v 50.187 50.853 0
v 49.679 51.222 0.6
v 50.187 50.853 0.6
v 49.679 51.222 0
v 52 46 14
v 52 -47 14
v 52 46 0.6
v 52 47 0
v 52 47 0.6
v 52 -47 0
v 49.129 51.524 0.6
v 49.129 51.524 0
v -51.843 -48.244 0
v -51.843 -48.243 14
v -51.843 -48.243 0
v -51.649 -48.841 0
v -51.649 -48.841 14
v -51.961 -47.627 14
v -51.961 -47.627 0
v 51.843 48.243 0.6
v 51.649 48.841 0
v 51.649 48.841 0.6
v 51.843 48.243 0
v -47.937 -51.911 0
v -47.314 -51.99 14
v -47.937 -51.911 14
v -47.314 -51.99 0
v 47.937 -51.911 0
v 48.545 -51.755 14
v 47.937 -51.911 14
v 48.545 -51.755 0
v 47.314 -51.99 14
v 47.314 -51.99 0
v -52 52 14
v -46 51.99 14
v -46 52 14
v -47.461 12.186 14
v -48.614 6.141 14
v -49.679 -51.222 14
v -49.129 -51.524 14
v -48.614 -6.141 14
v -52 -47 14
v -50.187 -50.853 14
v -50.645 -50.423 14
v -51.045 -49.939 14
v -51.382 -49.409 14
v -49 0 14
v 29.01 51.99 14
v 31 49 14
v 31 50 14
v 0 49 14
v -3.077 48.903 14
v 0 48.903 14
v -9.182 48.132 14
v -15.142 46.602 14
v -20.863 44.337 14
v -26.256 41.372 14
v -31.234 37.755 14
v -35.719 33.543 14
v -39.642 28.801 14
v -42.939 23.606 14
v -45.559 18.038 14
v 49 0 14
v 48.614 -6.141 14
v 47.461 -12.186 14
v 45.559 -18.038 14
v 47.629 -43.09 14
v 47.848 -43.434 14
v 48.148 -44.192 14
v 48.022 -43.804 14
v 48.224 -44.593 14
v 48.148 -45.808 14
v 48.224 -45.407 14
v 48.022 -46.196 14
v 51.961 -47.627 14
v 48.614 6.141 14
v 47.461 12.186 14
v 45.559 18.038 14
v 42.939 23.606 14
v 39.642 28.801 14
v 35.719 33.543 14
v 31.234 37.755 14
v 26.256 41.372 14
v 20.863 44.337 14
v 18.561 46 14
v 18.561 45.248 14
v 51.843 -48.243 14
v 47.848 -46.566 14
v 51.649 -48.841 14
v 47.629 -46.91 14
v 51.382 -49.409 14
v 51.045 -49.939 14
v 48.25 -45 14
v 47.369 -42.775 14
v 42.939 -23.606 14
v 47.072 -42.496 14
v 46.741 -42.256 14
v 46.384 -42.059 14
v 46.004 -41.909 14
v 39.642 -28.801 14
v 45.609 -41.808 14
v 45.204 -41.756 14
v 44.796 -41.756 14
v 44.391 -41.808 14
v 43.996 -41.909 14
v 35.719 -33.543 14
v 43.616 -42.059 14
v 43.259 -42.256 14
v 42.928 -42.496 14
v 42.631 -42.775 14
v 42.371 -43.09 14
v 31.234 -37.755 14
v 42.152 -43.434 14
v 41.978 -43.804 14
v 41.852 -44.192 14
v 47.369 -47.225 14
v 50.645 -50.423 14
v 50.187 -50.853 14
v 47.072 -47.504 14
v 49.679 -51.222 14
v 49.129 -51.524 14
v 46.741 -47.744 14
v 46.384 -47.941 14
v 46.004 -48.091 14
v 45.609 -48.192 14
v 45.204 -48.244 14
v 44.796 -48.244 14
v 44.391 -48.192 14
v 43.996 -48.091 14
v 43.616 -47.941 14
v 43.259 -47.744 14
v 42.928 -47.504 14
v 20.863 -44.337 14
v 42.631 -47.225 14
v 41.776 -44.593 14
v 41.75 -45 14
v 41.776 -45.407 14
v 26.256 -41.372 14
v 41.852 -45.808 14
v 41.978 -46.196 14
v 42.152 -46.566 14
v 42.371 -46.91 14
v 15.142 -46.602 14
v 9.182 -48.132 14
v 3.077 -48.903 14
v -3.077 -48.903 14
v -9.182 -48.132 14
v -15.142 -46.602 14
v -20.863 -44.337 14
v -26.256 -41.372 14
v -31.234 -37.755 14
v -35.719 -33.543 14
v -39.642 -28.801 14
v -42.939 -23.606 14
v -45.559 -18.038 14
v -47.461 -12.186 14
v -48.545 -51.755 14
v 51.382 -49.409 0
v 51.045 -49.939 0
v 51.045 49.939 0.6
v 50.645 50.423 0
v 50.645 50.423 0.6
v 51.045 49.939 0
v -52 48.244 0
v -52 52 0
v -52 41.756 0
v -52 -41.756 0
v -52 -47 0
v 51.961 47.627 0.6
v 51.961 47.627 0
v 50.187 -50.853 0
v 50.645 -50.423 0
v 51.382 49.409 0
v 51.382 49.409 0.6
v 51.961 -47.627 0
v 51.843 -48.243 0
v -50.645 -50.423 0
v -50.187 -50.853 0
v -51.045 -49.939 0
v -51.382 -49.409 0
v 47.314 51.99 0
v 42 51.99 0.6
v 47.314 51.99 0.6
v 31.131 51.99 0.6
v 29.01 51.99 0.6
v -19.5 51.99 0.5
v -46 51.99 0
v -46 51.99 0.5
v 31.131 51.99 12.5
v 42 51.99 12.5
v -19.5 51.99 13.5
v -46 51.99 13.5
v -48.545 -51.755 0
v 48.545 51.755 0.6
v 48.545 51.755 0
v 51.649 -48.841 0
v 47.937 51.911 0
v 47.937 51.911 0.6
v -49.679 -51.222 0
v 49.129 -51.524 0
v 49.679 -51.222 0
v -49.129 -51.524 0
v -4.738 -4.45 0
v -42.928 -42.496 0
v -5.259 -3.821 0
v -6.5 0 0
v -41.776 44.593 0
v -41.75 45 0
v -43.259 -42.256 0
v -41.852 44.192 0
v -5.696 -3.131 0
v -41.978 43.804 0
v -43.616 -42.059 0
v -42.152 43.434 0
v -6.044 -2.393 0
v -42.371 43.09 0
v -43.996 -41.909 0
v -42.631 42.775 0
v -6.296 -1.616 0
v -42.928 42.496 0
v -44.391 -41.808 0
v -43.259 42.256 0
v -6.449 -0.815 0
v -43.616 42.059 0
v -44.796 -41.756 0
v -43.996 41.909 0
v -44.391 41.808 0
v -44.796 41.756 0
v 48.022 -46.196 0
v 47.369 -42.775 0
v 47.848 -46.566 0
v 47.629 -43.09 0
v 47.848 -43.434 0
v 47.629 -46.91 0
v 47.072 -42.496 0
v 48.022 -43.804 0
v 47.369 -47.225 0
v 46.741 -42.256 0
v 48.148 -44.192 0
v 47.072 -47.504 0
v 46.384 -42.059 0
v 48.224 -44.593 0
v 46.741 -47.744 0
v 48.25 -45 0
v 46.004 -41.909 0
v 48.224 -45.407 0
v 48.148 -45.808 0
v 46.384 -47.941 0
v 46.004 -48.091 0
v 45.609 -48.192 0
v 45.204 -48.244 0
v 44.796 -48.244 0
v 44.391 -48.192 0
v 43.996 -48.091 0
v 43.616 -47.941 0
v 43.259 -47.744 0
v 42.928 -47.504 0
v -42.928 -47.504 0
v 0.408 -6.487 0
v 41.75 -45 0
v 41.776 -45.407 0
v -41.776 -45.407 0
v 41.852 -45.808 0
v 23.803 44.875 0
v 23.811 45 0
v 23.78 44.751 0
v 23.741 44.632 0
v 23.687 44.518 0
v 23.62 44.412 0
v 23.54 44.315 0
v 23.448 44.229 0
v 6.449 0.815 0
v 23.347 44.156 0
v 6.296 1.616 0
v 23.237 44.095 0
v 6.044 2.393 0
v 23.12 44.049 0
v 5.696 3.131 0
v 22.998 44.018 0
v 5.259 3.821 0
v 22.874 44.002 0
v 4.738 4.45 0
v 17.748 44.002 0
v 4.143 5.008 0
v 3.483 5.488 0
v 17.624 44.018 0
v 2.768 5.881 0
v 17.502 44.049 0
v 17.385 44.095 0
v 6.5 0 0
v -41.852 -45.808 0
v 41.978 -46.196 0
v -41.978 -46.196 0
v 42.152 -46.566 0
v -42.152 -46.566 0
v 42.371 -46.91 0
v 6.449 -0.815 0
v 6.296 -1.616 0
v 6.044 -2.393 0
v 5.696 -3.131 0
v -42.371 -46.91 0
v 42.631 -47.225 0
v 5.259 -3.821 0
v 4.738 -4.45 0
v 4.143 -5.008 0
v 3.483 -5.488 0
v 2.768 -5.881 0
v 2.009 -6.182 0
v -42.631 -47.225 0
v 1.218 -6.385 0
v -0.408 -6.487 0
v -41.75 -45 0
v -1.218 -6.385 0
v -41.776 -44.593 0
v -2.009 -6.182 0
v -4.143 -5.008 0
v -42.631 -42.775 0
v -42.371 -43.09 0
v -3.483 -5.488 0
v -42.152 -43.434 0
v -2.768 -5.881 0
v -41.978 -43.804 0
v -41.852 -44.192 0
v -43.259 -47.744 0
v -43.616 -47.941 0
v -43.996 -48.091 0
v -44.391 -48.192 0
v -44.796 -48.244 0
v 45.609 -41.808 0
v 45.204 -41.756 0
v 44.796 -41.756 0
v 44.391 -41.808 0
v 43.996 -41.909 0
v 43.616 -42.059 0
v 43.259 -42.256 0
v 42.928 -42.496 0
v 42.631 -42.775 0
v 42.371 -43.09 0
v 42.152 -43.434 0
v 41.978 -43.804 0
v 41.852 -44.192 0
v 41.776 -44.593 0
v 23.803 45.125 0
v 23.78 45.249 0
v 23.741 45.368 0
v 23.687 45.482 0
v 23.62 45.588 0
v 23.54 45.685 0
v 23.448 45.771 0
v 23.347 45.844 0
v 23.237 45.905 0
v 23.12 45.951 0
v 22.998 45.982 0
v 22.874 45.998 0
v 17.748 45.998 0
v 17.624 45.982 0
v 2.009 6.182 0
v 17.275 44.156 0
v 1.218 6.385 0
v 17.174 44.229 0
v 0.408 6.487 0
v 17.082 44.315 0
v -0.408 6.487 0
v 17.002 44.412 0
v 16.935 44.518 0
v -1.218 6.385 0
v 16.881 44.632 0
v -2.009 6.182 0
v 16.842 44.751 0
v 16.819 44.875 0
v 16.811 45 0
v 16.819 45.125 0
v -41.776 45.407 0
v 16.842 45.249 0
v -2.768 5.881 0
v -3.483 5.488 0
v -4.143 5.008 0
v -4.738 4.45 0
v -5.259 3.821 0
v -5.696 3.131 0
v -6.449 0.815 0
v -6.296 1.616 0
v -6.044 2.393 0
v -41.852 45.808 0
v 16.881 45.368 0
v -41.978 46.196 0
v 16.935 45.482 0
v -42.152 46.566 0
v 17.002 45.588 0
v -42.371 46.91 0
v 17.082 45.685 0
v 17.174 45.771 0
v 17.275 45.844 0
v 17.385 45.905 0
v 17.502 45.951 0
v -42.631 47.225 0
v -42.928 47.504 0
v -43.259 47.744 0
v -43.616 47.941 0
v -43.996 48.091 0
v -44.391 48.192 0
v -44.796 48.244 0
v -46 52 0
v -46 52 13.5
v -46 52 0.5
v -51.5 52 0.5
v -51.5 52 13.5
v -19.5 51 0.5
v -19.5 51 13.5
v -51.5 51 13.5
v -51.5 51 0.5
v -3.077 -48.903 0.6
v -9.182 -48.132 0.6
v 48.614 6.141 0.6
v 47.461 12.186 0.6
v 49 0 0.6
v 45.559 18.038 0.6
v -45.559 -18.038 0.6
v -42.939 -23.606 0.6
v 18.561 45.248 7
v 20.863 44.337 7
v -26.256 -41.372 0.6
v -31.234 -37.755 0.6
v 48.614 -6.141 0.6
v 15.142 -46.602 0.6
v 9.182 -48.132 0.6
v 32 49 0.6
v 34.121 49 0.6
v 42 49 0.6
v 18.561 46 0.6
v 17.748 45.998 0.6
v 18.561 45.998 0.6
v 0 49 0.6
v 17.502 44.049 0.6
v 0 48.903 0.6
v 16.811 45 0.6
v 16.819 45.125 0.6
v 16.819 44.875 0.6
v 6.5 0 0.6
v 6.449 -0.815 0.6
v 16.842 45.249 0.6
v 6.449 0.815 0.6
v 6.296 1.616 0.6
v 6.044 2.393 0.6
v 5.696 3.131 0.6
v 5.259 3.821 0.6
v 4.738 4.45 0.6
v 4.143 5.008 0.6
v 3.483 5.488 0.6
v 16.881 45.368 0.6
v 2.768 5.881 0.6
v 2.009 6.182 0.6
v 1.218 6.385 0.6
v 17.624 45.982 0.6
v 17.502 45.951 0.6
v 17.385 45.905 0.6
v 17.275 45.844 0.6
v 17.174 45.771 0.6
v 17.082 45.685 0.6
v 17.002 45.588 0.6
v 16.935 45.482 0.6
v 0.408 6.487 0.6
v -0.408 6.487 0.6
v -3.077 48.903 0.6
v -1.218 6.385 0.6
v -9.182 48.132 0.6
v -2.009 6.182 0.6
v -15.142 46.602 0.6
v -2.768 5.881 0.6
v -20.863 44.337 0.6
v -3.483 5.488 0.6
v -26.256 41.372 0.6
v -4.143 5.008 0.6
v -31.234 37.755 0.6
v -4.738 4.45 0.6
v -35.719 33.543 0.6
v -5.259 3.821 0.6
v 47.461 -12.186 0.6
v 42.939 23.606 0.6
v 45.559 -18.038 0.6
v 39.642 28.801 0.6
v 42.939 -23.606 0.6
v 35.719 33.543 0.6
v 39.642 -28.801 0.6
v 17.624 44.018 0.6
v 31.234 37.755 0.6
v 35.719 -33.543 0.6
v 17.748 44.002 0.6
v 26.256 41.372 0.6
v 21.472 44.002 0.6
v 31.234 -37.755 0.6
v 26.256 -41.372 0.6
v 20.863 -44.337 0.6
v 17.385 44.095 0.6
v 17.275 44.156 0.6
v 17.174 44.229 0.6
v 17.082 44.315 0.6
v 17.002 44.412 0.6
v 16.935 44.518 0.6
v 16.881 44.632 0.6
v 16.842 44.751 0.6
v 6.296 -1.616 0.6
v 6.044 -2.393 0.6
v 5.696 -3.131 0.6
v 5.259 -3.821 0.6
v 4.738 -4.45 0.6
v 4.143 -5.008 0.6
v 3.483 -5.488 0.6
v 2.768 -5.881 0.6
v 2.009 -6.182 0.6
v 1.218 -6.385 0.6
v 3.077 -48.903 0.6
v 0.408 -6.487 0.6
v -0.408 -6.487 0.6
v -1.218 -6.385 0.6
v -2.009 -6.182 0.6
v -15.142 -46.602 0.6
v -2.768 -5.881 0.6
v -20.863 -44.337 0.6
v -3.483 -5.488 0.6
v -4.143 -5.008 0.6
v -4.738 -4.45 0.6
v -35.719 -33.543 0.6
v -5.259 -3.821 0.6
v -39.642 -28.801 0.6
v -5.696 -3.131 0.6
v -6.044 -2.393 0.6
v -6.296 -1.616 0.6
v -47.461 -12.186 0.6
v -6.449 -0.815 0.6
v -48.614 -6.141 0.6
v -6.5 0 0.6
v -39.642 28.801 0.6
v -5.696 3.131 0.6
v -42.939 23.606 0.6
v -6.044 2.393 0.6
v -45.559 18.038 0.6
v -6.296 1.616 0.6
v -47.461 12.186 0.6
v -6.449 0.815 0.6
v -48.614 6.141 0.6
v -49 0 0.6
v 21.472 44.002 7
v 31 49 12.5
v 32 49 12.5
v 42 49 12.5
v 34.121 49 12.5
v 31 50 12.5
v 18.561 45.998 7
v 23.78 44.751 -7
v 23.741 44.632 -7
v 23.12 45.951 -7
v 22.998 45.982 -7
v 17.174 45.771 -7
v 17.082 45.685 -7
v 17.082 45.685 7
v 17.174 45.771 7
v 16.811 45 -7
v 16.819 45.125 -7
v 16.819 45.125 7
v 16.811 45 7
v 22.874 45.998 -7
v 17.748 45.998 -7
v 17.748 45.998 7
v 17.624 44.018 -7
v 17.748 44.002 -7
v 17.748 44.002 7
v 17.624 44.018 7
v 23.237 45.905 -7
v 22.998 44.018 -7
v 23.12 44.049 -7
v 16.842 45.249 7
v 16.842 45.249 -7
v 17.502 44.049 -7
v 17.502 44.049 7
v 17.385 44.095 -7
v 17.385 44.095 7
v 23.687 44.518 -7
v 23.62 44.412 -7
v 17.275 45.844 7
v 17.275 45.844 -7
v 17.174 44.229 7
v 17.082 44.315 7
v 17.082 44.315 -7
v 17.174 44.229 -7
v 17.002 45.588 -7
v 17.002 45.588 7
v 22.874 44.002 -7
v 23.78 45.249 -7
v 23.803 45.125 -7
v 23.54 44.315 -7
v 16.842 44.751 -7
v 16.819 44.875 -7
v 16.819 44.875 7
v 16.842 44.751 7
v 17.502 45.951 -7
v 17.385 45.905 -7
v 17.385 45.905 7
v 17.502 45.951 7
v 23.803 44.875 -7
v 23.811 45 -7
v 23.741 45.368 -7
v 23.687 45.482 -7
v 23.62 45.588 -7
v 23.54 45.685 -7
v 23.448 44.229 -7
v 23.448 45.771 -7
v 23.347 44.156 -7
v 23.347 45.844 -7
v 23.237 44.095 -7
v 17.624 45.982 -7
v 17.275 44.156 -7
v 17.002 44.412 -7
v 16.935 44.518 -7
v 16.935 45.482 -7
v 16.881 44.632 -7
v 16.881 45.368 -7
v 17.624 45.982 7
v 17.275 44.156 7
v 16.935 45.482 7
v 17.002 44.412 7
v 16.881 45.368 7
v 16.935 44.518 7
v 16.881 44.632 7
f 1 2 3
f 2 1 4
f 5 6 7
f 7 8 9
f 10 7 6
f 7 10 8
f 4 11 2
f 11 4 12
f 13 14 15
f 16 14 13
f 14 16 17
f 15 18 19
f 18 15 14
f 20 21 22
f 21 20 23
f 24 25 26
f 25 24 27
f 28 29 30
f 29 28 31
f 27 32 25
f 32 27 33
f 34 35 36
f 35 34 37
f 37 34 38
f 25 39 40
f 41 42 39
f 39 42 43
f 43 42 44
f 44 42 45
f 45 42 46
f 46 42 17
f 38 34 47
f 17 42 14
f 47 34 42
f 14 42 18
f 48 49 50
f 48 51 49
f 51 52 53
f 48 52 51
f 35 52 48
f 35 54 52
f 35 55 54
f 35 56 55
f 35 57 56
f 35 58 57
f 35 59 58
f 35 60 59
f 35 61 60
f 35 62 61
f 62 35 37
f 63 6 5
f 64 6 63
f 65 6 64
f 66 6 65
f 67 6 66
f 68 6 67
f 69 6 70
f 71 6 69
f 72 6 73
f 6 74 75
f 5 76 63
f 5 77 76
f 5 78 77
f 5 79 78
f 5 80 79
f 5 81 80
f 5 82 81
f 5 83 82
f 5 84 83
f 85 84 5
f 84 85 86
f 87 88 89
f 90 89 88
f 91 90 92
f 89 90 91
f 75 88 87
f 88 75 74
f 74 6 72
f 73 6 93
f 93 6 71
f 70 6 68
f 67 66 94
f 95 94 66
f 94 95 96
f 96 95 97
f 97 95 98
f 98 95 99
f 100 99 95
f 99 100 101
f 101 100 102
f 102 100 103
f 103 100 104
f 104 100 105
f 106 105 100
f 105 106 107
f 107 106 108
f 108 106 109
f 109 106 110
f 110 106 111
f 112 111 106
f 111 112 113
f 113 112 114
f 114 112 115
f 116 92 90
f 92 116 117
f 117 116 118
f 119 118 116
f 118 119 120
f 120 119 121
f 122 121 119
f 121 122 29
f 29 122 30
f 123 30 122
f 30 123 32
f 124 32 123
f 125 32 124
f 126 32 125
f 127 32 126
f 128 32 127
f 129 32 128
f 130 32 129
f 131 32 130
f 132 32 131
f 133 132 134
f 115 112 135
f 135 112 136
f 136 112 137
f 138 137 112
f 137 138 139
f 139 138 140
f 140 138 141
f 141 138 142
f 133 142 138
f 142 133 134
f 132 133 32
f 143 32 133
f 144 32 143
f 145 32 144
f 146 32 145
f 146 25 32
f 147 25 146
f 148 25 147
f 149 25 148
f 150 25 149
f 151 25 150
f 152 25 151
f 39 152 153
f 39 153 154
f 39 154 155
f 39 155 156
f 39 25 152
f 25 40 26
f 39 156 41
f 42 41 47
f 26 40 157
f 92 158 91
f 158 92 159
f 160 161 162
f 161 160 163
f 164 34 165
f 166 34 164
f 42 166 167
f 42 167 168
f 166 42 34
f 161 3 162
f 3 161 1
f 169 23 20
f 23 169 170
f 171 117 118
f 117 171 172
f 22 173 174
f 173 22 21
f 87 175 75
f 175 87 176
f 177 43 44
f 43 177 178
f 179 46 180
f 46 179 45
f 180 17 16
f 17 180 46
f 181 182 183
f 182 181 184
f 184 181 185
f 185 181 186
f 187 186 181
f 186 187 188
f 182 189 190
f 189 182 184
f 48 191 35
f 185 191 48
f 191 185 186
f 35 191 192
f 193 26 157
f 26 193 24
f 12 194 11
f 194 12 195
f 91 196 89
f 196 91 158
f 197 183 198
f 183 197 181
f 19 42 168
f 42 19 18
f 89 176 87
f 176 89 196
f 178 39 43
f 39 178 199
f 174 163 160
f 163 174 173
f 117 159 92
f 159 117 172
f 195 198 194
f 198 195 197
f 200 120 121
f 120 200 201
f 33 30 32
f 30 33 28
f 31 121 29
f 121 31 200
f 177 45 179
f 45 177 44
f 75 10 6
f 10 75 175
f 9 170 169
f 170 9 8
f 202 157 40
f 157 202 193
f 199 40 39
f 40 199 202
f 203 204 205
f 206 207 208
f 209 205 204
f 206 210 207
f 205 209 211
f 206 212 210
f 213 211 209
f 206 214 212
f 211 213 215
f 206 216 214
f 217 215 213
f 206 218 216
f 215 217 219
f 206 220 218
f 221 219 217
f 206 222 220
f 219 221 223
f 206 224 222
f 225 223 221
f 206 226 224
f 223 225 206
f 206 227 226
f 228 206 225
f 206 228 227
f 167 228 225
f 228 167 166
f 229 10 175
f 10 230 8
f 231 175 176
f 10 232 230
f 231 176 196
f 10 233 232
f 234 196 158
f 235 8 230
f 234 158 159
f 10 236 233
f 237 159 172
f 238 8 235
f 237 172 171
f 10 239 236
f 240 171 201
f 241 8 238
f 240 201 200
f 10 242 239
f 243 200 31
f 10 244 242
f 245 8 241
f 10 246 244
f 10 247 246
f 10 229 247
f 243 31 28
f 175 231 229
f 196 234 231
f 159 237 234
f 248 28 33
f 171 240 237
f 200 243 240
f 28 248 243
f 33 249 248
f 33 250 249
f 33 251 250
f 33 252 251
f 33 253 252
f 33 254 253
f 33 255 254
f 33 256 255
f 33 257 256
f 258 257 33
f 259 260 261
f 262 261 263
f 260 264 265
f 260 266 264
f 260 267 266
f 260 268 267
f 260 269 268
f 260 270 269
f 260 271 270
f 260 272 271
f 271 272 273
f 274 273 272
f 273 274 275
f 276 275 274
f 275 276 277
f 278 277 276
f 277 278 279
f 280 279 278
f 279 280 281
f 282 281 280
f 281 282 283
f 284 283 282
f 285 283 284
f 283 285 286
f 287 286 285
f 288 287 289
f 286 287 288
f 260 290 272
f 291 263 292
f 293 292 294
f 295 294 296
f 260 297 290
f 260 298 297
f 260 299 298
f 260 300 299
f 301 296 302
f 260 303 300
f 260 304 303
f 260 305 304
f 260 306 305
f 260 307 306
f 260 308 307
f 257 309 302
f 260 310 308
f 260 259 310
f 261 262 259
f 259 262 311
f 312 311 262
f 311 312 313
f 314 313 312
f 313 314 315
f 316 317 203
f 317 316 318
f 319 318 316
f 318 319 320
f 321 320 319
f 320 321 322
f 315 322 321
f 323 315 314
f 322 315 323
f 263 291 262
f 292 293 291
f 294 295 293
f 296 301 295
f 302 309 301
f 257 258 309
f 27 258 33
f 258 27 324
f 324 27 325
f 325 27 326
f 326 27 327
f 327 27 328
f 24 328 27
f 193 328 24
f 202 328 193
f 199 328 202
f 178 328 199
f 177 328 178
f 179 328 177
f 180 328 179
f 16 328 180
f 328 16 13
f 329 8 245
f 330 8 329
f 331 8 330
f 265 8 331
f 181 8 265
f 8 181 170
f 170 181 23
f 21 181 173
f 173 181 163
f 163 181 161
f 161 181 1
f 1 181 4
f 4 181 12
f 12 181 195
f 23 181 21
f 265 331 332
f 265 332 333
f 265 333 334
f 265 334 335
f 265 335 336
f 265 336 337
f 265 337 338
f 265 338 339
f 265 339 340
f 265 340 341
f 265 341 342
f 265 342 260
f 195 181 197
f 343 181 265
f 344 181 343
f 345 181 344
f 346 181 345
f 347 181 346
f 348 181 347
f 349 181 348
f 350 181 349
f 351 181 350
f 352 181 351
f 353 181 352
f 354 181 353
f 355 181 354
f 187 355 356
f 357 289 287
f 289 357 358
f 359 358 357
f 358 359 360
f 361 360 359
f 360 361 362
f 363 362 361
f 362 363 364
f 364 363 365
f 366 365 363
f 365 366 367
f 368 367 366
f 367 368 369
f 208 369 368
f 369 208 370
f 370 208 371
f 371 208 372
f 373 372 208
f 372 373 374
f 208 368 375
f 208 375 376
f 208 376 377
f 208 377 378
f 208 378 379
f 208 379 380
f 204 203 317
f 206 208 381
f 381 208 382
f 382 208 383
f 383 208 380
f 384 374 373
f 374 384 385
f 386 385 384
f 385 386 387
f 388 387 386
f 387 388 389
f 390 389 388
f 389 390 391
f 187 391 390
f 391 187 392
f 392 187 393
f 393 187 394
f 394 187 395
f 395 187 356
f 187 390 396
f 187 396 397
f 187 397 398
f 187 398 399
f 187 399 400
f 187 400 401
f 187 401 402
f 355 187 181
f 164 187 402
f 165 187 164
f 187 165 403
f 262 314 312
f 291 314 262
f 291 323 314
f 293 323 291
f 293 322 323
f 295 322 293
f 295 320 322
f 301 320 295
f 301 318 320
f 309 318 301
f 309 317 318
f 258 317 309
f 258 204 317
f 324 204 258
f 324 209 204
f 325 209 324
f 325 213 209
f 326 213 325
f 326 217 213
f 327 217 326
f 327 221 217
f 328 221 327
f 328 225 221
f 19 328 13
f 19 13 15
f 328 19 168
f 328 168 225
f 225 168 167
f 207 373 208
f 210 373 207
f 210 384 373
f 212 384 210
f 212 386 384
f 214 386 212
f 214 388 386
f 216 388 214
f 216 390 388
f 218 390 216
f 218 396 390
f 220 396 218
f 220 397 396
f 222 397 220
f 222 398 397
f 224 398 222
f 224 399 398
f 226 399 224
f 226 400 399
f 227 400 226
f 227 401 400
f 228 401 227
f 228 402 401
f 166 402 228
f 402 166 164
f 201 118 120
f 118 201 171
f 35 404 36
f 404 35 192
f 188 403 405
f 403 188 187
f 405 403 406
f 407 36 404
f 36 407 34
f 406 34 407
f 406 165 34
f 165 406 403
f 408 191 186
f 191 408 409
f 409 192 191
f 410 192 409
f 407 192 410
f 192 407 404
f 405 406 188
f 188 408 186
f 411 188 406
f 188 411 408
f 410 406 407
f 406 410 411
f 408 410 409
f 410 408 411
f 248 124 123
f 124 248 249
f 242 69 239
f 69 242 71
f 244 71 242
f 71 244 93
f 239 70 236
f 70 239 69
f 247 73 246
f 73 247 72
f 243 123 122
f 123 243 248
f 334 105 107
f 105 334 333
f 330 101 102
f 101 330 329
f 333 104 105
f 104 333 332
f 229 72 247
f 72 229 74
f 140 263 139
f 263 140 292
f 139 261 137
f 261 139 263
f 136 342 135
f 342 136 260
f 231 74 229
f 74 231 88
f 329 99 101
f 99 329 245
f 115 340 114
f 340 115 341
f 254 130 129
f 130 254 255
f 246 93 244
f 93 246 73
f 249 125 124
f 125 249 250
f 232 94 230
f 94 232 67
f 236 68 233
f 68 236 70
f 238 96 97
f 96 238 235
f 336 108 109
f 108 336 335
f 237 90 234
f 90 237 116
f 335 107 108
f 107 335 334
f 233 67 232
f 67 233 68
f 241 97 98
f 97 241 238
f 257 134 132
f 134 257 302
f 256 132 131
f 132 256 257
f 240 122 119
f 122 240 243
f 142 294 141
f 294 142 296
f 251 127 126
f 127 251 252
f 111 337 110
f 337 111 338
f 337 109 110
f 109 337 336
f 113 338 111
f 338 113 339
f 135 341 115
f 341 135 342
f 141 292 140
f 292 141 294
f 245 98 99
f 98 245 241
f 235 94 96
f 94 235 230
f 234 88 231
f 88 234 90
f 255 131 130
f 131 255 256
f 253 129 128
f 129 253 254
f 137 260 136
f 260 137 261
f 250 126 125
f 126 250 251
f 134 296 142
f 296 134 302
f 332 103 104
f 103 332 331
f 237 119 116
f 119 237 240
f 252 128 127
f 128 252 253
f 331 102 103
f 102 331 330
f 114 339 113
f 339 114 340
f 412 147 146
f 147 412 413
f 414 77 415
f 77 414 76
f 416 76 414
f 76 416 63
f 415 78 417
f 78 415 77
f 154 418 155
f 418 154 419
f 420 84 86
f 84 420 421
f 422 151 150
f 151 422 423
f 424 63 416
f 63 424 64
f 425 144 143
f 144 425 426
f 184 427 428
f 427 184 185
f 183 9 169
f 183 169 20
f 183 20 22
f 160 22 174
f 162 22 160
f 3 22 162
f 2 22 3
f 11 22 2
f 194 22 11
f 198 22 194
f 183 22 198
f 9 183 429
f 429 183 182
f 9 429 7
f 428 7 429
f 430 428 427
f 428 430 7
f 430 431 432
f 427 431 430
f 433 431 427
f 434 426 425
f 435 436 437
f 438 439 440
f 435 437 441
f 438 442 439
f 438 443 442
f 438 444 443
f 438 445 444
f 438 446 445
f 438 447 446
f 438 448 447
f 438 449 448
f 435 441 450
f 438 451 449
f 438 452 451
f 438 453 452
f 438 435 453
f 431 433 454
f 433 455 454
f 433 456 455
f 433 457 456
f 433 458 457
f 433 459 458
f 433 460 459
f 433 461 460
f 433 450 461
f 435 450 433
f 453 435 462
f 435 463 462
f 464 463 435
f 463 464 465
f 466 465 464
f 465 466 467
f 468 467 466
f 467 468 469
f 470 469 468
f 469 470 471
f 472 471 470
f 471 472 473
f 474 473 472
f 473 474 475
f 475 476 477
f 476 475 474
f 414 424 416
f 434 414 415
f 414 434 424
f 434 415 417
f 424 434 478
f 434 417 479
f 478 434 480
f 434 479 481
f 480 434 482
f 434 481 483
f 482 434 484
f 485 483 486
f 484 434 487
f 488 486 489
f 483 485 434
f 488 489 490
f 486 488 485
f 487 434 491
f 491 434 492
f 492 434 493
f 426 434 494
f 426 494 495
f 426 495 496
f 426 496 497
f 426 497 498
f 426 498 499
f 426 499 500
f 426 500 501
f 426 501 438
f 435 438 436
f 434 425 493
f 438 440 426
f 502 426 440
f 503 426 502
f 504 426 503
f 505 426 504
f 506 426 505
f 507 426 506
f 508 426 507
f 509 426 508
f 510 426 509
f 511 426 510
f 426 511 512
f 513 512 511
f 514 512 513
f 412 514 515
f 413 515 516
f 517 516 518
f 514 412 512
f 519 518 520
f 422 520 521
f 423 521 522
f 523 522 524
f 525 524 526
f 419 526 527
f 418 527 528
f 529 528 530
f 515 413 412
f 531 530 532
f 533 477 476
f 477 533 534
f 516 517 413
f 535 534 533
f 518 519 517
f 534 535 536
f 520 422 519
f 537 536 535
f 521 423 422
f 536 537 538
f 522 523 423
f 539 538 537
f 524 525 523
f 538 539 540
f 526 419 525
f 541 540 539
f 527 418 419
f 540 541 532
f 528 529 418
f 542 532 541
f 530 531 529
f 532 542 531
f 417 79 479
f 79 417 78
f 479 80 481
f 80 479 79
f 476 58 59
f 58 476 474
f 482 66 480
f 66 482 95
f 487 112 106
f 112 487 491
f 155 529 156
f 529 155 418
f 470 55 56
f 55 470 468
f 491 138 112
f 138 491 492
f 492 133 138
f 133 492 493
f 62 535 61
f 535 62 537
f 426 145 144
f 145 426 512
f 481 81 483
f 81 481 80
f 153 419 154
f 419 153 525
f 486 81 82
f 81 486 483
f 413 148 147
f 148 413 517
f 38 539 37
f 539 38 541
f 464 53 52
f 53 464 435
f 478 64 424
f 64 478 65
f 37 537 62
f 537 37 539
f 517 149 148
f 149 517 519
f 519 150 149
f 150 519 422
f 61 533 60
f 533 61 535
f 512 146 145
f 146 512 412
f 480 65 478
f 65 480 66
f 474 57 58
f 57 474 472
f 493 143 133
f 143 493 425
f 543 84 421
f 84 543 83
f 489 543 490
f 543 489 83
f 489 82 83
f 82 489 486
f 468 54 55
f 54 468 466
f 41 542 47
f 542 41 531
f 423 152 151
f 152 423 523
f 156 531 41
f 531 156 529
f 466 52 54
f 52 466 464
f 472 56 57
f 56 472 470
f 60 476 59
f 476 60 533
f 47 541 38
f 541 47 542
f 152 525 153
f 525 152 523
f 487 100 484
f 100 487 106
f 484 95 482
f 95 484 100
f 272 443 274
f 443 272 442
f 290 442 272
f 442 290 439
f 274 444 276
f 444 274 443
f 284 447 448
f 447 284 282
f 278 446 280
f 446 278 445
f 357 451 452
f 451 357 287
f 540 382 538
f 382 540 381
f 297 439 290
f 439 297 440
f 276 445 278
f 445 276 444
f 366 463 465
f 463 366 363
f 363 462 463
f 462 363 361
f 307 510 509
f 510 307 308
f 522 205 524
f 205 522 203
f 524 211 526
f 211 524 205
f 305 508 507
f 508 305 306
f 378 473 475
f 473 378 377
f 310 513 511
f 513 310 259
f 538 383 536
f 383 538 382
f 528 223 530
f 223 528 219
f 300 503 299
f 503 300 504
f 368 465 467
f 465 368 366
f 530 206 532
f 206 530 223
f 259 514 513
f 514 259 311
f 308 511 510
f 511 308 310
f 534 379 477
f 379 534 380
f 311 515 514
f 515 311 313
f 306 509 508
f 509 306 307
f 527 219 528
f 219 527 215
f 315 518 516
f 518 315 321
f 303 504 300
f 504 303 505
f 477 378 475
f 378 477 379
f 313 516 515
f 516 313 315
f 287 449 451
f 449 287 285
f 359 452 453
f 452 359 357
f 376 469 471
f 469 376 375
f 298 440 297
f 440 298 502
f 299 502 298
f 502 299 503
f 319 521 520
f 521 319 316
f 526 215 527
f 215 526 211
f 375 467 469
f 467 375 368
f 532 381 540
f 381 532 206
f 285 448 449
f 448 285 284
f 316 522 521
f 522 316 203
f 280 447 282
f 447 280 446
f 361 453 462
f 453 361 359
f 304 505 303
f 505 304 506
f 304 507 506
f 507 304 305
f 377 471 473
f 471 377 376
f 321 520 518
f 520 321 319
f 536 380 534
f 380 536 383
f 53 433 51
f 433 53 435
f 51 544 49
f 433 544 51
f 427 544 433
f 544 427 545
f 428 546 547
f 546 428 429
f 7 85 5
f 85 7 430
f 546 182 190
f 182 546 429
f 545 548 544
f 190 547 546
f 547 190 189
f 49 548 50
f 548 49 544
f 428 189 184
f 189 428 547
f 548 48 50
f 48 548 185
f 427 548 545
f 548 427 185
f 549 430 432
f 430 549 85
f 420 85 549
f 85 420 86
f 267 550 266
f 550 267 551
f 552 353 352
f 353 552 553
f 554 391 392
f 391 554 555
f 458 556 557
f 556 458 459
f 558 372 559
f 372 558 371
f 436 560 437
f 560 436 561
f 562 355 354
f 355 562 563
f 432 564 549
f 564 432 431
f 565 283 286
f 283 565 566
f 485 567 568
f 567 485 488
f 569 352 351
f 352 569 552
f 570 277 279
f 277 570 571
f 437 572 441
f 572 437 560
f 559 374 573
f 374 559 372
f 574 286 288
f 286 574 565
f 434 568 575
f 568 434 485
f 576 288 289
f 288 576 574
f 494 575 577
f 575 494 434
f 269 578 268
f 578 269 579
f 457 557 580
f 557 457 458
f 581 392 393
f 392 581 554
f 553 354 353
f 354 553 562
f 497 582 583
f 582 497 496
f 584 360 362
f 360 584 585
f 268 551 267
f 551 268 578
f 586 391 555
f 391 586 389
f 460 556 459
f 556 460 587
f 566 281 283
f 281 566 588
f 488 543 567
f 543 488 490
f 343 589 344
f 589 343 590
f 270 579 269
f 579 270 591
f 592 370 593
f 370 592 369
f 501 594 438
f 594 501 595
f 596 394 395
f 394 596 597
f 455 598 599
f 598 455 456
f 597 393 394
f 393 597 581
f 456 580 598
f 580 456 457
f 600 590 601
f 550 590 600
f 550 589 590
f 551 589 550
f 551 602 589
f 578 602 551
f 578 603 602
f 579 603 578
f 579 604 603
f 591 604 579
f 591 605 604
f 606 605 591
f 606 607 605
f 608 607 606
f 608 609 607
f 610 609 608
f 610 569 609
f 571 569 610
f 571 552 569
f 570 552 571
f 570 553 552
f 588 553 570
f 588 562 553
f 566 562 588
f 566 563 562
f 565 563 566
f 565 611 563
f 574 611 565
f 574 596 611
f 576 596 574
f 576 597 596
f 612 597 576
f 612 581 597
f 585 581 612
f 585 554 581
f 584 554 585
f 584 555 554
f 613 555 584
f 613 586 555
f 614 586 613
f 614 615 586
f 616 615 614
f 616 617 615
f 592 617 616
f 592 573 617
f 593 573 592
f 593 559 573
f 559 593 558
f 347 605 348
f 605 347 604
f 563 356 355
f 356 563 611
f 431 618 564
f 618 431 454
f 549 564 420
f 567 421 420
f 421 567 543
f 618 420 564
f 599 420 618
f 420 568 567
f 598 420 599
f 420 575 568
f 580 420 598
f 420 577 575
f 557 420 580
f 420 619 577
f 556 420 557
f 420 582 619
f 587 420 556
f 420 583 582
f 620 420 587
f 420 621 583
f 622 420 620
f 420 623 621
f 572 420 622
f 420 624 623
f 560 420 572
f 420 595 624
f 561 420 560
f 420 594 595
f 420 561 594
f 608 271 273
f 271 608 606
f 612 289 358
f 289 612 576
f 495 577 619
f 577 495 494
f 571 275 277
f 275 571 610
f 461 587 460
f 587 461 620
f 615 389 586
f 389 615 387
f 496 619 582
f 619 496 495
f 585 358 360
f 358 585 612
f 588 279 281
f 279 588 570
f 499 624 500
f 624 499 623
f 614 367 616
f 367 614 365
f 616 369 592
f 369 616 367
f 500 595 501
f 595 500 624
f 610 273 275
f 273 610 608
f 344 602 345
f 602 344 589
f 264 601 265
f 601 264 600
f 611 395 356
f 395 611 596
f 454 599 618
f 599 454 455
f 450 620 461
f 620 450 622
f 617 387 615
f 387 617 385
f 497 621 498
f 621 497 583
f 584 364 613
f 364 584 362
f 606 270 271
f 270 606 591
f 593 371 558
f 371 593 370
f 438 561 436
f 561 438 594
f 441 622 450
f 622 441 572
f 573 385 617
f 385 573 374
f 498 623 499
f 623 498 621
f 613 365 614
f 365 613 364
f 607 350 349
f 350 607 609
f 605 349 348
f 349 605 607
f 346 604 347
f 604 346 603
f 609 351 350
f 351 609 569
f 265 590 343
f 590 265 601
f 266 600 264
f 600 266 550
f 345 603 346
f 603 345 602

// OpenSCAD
$fn = 50;


union() {
	difference() {
		union() {
			hull() {
				translate(v = [-47.0000000000, 47.0000000000, 0]) {
					cylinder(h = 14, r = 5);
				}
				translate(v = [47.0000000000, 47.0000000000, 0]) {
					cylinder(h = 14, r = 5);
				}
				translate(v = [-47.0000000000, -47.0000000000, 0]) {
					cylinder(h = 14, r = 5);
				}
				translate(v = [47.0000000000, -47.0000000000, 0]) {
					cylinder(h = 14, r = 5);
				}
			}
			translate(v = [-52.0000000000, 46.0000000000, 0]) {
				cube(size = [6, 6, 14]);
			}
		}
		union() {
			translate(v = [-52.5000000000, -45.0000000000, -250.0000000000]) {
				rotate(a = [0, 0, 0]) {
					difference() {
						union() {
							hull() {
								translate(v = [7.5000000000, 0, 0]) {
									cylinder(h = 250, r = 3.2500000000, r1 = 3.2500000000, r2 = 3.2500000000);
								}
								translate(v = [-7.5000000000, 0, 0]) {
									cylinder(h = 250, r = 3.2500000000, r1 = 3.2500000000, r2 = 3.2500000000);
								}
							}
						}
						union();
					}
				}
			}
			translate(v = [-52.5000000000, 45.0000000000, -250.0000000000]) {
				rotate(a = [0, 0, 0]) {
					difference() {
						union() {
							hull() {
								translate(v = [7.5000000000, 0, 0]) {
									cylinder(h = 250, r = 3.2500000000, r1 = 3.2500000000, r2 = 3.2500000000);
								}
								translate(v = [-7.5000000000, 0, 0]) {
									cylinder(h = 250, r = 3.2500000000, r1 = 3.2500000000, r2 = 3.2500000000);
								}
							}
						}
						union();
					}
				}
			}
			translate(v = [-51.5000000000, 51.0000000000, 0.5000000000]) {
				cube(size = [32, 1, 13.0000000000]);
			}
			translate(v = [45.0000000000, -45.0000000000, 0]) {
				cylinder(h = 100, r = 3.2500000000);
			}
			translate(v = [0, 0, 0.6000000000]) {
				cylinder(h = 16.4000000000, r = 49.0000000000);
			}
			translate(v = [0, 0, -7.0000000000]) {
				cylinder(h = 14, r = 6.5000000000);
			}
			translate(v = [0.0000000000, 46.0000000000, 0.6000000000]) {
				cube(size = [52.0000000000, 3, 16.4000000000]);
			}
			translate(v = [42.0000000000, 46.0000000000, 0.6000000000]) {
				cube(size = [10, 6, 16.4000000000]);
			}
			translate(v = [31.0000000000, 46.0000000000, 12.5000000000]) {
				cube(size = [21, 6, 1.5000000000]);
			}
			translate(v = [28.2500000000, 52.7500000000, 0.6000000000]) {
				rotate(a = [0, 0, -45]) {
					cube(size = [7.5000000000, 1.5000000000, 16.4000000000]);
				}
			}
			translate(v = [11.0610000000, 44.0000000000, 0.6000000000]) {
				cube(size = [7.5000000000, 2, 13.4000000000]);
			}
		}
	}
	union() {
		translate(v = [20.3110000000, 45.0000000000, -7.0000000000]) {
			rotate(a = [0, 0, 0]) {
				difference() {
					union() {
						#hull() {
							#translate(v = [2.5000000000, 0, 0]) {
								cylinder(h = 14, r = 1.0000000000, r1 = 1.0000000000, r2 = 1.0000000000);
							}
							#translate(v = [-2.5000000000, 0, 0]) {
								cylinder(h = 14, r = 1.0000000000, r1 = 1.0000000000, r2 = 1.0000000000);
							}
						}
					}
					union();
				}
			}
		}
	}
}
